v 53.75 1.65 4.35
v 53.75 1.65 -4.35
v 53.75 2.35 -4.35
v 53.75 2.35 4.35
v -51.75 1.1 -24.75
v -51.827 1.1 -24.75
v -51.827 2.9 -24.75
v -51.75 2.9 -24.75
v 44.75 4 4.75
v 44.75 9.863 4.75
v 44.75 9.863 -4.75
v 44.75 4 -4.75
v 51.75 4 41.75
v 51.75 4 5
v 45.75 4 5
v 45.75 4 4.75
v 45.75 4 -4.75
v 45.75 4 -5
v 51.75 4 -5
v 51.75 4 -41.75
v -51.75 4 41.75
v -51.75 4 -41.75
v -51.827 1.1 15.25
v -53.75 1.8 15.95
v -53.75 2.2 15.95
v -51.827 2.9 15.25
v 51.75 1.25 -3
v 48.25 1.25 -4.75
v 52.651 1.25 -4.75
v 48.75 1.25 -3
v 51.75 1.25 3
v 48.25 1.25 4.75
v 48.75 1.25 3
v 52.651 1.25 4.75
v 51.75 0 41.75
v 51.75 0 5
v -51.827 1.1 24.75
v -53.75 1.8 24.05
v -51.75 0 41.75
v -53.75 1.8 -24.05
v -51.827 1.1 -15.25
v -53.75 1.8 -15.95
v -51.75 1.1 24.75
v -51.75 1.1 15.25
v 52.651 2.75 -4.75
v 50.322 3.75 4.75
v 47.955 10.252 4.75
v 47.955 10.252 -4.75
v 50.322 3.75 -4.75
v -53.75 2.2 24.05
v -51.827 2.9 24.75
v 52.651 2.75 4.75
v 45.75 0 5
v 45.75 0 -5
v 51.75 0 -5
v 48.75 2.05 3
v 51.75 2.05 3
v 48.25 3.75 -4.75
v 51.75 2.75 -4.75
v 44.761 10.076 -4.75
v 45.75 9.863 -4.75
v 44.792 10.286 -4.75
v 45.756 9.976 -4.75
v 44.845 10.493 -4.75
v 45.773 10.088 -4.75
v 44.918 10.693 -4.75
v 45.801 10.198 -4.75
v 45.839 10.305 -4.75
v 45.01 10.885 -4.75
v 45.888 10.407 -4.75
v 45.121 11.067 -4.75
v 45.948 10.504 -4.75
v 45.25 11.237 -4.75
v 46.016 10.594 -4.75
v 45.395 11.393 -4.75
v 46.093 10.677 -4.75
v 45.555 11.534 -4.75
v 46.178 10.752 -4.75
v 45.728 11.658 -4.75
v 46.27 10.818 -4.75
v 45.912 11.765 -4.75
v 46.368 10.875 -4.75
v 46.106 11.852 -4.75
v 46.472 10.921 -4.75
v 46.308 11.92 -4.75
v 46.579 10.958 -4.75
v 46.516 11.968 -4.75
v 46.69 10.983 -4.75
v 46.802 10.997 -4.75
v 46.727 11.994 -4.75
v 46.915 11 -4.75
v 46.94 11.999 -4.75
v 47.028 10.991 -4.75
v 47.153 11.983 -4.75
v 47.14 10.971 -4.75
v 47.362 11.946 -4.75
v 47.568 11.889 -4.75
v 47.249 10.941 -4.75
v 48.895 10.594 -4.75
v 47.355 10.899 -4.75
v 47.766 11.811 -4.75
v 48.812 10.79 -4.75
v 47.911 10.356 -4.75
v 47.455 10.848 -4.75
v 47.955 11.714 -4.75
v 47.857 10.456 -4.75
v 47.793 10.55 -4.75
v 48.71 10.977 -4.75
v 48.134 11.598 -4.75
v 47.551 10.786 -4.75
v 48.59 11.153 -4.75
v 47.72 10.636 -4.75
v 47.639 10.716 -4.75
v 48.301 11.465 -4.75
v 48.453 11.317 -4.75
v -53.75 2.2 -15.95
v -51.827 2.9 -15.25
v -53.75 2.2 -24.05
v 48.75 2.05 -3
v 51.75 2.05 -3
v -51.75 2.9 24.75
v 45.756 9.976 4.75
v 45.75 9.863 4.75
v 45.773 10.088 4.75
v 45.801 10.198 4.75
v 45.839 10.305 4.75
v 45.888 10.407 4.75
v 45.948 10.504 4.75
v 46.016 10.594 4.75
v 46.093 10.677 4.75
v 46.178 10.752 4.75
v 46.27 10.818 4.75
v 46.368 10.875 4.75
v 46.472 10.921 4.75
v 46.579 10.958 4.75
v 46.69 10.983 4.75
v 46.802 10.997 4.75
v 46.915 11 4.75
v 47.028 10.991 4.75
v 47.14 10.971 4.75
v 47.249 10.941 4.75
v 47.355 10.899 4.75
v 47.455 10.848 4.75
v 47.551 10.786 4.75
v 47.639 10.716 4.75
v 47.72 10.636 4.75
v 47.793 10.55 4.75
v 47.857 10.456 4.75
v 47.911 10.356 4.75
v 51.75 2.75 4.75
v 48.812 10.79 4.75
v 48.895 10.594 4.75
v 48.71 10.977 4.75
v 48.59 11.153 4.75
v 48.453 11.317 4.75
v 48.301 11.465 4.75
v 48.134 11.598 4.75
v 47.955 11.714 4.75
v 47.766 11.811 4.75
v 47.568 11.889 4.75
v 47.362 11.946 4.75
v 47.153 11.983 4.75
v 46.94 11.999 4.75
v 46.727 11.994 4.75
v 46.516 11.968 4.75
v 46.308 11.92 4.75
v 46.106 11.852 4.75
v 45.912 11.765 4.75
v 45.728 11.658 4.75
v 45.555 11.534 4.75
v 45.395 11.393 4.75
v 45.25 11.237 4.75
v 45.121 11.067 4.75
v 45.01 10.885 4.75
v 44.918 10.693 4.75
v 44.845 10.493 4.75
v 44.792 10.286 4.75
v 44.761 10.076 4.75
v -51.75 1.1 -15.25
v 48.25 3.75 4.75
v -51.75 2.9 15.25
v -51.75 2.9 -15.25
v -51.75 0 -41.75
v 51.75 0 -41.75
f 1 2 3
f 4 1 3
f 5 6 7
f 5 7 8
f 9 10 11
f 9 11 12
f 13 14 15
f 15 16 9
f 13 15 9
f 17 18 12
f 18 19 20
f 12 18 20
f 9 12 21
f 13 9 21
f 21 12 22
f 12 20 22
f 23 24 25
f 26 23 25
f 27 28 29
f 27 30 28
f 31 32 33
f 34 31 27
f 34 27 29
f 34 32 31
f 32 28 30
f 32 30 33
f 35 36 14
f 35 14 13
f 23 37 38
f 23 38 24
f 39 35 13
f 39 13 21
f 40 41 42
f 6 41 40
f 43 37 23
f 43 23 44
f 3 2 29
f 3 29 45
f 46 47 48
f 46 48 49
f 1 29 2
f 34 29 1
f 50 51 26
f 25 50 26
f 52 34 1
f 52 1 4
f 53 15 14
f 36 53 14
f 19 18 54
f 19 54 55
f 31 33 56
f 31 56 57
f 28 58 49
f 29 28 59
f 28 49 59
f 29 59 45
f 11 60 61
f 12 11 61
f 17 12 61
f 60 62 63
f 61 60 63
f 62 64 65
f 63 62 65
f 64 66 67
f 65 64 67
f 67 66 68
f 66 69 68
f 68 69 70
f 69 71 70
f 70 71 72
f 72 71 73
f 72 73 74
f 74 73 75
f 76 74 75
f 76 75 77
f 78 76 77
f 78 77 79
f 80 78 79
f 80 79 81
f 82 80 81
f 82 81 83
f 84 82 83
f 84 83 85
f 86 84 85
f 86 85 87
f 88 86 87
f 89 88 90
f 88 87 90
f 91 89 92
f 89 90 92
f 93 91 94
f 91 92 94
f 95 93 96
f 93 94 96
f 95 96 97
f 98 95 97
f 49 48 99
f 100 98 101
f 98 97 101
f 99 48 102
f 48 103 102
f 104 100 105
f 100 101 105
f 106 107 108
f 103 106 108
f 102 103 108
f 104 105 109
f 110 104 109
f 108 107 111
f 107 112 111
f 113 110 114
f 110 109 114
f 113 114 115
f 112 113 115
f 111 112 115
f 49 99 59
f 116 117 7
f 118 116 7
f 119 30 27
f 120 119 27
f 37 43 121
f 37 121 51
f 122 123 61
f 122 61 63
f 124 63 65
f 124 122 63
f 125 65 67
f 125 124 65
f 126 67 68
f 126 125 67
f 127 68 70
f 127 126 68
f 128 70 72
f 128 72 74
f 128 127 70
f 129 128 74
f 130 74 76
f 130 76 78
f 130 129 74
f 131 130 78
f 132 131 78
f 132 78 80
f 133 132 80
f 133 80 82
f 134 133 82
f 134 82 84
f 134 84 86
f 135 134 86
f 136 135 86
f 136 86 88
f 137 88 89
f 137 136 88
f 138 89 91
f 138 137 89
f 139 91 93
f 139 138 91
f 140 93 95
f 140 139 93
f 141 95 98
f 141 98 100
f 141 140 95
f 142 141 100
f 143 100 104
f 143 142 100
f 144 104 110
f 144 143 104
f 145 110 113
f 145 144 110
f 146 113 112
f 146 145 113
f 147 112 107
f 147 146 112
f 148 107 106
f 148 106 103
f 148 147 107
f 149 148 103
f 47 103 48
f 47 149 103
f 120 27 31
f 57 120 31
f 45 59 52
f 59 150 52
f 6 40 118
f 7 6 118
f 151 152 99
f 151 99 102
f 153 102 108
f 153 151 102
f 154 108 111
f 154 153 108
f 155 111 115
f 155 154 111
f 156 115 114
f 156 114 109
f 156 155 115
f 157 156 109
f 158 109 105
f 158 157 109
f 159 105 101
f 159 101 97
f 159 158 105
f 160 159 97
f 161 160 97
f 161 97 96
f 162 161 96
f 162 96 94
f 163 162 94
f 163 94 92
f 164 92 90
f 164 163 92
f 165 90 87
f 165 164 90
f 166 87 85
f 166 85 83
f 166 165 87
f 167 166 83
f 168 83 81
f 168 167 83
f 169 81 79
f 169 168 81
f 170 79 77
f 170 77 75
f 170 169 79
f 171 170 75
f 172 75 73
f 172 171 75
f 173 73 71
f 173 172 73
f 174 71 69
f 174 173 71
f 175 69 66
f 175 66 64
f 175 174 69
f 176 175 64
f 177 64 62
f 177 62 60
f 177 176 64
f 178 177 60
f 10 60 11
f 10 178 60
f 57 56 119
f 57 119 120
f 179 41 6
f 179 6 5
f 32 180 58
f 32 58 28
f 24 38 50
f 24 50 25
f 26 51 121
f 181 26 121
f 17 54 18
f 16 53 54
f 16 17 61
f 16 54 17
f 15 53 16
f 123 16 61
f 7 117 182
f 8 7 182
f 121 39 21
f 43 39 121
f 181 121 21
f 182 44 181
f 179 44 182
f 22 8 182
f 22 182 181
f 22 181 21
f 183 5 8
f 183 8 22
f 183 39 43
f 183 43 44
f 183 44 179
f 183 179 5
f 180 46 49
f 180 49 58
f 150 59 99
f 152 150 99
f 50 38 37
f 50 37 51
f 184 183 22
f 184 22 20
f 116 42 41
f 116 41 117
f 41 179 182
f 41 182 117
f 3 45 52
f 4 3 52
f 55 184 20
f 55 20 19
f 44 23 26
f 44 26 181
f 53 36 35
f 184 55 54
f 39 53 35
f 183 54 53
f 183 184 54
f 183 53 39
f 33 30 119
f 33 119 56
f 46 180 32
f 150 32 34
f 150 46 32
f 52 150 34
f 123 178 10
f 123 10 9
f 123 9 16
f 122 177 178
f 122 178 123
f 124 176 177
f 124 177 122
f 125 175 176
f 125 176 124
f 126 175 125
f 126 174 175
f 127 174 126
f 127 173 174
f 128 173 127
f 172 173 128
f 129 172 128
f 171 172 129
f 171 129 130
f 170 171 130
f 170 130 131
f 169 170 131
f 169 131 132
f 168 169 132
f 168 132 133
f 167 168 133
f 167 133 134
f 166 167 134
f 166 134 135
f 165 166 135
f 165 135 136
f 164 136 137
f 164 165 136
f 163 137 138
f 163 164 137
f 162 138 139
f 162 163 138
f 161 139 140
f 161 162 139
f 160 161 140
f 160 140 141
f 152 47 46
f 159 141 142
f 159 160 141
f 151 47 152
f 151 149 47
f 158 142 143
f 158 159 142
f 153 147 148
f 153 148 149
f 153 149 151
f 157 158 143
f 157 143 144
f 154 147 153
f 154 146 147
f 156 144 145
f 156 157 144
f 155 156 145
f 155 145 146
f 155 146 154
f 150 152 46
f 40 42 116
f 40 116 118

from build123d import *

# Parameters (mm, degrees)
BOSS_EXTRUDE1_DEPTH      = 4
CUT_EXTRUDE1_REACH       = 6
SKETCH3_W                = 6
SKETCH3_H                = 10
SKETCH4_W                = 2
SKETCH4_H                = 1.5
BOSS_EXTRUDE2_DEPTH      = 4.75
BOSS_EXTRUDE2_DEPTH_BACK = 4.75
SKETCH5_W                = 3
SKETCH5_H                = 6
CUT_EXTRUDE2_DEPTH       = 0.8
SKETCH6_W                = 2
SKETCH6_H                = 1.1
CUT_EXTRUDE3_DEPTH       = 67.5
CHAMFER3_SIZE            = 0.4
CHAMFER3_SIZE2           = 1.098990968
CHAMFER4_SIZE            = 0.7
CHAMFER4_SIZE2           = 1.923234194
CHAMFER4_PART_2_SIZE     = 0.7
CHAMFER4_PART_2_SIZE2    = 1.923234194


with BuildPart() as part:
    # Sketch1 → Boss-Extrude1 (new body)
    with BuildSketch(Plane(origin=(0, 0, 0), x_dir=(1, 0, 0), z_dir=(0, 1, 0))):
        Polygon((-51.75, 24.75), (-51.75, 41.75), (51.75, 41.75), (51.75, -41.75), (-51.75, -41.75), (-51.75, -24.75), (-53.75, -24.75), (-53.75, -15.25), (-51.75, -15.25), (-51.75, 15.25), (-53.75, 15.25), (-53.75, 24.75), align=None)
    extrude(amount=BOSS_EXTRUDE1_DEPTH)

    # Sketch3 → Cut-Extrude1 (cut, up to next)
    with BuildSketch(Plane(origin=(0, 4, 0), x_dir=(1, 0, 0), z_dir=(0, 1, 0)), mode=Mode.PRIVATE) as cut_extrude1_sk1:
        with Locations((48.75, 0)):
            Rectangle(SKETCH3_W, SKETCH3_H)
    cut_extrude1_tool1 = extrude(cut_extrude1_sk1.sketch, amount=-CUT_EXTRUDE1_REACH, mode=Mode.PRIVATE) & part.part
    add(cut_extrude1_tool1.solids().sort_by_distance((48.75, 4, 0))[0], mode=Mode.SUBTRACT)

    # Sketch4 → Boss-Extrude2 (add, two sides)
    with BuildSketch(Plane.XY) as boss_extrude2_sk:
        with BuildLine():
            Line((44.75, 4), (45.75, 4))
            Line((45.75, 4), (45.75, 9.863040099))
            ThreePointArc((45.75, 9.863040099), (46.689528886, 10.982727024), (47.955352731, 10.251903287))
            Line((47.955352731, 10.251903287), (50.321851993, 3.75))
            Line((50.321851993, 3.75), (48.25, 3.75))
            Line((48.25, 3.75), (48.25, 1.25))
            Line((48.25, 1.25), (51.75, 1.25))
            Line((51.75, 1.25), (51.75, 2.75))
            Line((51.75, 2.75), (48.895045351, 10.59392343))
            ThreePointArc((48.895045351, 10.59392343), (46.515880709, 11.967534777), (44.75, 9.863040099))
            Line((44.75, 9.863040099), (44.75, 4))
        make_face()
        with Locations((52.75, 2)):
            Rectangle(SKETCH4_W, SKETCH4_H)
    extrude(amount=BOSS_EXTRUDE2_DEPTH)
    extrude(boss_extrude2_sk.sketch, amount=-BOSS_EXTRUDE2_DEPTH_BACK)

    # Sketch5 → Cut-Extrude2 (cut)
    with BuildSketch(Plane.XZ.offset(-1.25)):
        with Locations((50.25, 0)):
            Rectangle(SKETCH5_W, SKETCH5_H)
    extrude(amount=-CUT_EXTRUDE2_DEPTH, mode=Mode.SUBTRACT)

    # Sketch6 → Cut-Extrude3 (cut, through all)
    with BuildSketch(Plane.XY.offset(24.75)):
        with Locations((-52.75, 3.45)):
            Rectangle(SKETCH6_W, SKETCH6_H)
        with Locations((-52.75, 0.55)):
            Rectangle(SKETCH6_W, SKETCH6_H)
    extrude(amount=-CUT_EXTRUDE3_DEPTH, mode=Mode.SUBTRACT)

    # Chamfer3
    chamfer3_edges = [part.edges().sort_by_distance(p)[0] for p in [
        (53.75, 2.75, 0),
        (53.75, 2, 4.75),
        (53.75, 1.25, 0),
        (53.75, 2, -4.75),
    ]]
    chamfer3_side = [part.faces().sort_by_distance(p)[0] for p in [
        (53.75, 2, 0),
    ]]
    chamfer(chamfer3_edges, length=CHAMFER3_SIZE, length2=CHAMFER3_SIZE2, reference=chamfer3_side[0])

    # Chamfer4
    chamfer4_edges = [part.edges().sort_by_distance(p)[0] for p in [
        (-53.75, 2, 15.25),
        (-53.75, 2.9, 20),
        (-53.75, 1.1, 20),
        (-53.75, 2, 24.75),
    ]]
    chamfer4_side = [part.faces().sort_by_distance(p)[0] for p in [
        (-53.75, 2, 20),
    ]]
    chamfer(chamfer4_edges, length=CHAMFER4_SIZE, length2=CHAMFER4_SIZE2, reference=chamfer4_side[0])

    # Chamfer4 part 2
    chamfer4_part_2_edges = [part.edges().sort_by_distance(p)[0] for p in [
        (-53.75, 2, -15.25),
        (-53.75, 2, -24.75),
        (-53.75, 2.9, -20),
        (-53.75, 1.1, -20),
    ]]
    chamfer4_part_2_side = [part.faces().sort_by_distance(p)[0] for p in [
        (-53.75, 2, -20),
    ]]
    chamfer(chamfer4_part_2_edges, length=CHAMFER4_PART_2_SIZE, length2=CHAMFER4_PART_2_SIZE2, reference=chamfer4_part_2_side[0])


solid = part.part
